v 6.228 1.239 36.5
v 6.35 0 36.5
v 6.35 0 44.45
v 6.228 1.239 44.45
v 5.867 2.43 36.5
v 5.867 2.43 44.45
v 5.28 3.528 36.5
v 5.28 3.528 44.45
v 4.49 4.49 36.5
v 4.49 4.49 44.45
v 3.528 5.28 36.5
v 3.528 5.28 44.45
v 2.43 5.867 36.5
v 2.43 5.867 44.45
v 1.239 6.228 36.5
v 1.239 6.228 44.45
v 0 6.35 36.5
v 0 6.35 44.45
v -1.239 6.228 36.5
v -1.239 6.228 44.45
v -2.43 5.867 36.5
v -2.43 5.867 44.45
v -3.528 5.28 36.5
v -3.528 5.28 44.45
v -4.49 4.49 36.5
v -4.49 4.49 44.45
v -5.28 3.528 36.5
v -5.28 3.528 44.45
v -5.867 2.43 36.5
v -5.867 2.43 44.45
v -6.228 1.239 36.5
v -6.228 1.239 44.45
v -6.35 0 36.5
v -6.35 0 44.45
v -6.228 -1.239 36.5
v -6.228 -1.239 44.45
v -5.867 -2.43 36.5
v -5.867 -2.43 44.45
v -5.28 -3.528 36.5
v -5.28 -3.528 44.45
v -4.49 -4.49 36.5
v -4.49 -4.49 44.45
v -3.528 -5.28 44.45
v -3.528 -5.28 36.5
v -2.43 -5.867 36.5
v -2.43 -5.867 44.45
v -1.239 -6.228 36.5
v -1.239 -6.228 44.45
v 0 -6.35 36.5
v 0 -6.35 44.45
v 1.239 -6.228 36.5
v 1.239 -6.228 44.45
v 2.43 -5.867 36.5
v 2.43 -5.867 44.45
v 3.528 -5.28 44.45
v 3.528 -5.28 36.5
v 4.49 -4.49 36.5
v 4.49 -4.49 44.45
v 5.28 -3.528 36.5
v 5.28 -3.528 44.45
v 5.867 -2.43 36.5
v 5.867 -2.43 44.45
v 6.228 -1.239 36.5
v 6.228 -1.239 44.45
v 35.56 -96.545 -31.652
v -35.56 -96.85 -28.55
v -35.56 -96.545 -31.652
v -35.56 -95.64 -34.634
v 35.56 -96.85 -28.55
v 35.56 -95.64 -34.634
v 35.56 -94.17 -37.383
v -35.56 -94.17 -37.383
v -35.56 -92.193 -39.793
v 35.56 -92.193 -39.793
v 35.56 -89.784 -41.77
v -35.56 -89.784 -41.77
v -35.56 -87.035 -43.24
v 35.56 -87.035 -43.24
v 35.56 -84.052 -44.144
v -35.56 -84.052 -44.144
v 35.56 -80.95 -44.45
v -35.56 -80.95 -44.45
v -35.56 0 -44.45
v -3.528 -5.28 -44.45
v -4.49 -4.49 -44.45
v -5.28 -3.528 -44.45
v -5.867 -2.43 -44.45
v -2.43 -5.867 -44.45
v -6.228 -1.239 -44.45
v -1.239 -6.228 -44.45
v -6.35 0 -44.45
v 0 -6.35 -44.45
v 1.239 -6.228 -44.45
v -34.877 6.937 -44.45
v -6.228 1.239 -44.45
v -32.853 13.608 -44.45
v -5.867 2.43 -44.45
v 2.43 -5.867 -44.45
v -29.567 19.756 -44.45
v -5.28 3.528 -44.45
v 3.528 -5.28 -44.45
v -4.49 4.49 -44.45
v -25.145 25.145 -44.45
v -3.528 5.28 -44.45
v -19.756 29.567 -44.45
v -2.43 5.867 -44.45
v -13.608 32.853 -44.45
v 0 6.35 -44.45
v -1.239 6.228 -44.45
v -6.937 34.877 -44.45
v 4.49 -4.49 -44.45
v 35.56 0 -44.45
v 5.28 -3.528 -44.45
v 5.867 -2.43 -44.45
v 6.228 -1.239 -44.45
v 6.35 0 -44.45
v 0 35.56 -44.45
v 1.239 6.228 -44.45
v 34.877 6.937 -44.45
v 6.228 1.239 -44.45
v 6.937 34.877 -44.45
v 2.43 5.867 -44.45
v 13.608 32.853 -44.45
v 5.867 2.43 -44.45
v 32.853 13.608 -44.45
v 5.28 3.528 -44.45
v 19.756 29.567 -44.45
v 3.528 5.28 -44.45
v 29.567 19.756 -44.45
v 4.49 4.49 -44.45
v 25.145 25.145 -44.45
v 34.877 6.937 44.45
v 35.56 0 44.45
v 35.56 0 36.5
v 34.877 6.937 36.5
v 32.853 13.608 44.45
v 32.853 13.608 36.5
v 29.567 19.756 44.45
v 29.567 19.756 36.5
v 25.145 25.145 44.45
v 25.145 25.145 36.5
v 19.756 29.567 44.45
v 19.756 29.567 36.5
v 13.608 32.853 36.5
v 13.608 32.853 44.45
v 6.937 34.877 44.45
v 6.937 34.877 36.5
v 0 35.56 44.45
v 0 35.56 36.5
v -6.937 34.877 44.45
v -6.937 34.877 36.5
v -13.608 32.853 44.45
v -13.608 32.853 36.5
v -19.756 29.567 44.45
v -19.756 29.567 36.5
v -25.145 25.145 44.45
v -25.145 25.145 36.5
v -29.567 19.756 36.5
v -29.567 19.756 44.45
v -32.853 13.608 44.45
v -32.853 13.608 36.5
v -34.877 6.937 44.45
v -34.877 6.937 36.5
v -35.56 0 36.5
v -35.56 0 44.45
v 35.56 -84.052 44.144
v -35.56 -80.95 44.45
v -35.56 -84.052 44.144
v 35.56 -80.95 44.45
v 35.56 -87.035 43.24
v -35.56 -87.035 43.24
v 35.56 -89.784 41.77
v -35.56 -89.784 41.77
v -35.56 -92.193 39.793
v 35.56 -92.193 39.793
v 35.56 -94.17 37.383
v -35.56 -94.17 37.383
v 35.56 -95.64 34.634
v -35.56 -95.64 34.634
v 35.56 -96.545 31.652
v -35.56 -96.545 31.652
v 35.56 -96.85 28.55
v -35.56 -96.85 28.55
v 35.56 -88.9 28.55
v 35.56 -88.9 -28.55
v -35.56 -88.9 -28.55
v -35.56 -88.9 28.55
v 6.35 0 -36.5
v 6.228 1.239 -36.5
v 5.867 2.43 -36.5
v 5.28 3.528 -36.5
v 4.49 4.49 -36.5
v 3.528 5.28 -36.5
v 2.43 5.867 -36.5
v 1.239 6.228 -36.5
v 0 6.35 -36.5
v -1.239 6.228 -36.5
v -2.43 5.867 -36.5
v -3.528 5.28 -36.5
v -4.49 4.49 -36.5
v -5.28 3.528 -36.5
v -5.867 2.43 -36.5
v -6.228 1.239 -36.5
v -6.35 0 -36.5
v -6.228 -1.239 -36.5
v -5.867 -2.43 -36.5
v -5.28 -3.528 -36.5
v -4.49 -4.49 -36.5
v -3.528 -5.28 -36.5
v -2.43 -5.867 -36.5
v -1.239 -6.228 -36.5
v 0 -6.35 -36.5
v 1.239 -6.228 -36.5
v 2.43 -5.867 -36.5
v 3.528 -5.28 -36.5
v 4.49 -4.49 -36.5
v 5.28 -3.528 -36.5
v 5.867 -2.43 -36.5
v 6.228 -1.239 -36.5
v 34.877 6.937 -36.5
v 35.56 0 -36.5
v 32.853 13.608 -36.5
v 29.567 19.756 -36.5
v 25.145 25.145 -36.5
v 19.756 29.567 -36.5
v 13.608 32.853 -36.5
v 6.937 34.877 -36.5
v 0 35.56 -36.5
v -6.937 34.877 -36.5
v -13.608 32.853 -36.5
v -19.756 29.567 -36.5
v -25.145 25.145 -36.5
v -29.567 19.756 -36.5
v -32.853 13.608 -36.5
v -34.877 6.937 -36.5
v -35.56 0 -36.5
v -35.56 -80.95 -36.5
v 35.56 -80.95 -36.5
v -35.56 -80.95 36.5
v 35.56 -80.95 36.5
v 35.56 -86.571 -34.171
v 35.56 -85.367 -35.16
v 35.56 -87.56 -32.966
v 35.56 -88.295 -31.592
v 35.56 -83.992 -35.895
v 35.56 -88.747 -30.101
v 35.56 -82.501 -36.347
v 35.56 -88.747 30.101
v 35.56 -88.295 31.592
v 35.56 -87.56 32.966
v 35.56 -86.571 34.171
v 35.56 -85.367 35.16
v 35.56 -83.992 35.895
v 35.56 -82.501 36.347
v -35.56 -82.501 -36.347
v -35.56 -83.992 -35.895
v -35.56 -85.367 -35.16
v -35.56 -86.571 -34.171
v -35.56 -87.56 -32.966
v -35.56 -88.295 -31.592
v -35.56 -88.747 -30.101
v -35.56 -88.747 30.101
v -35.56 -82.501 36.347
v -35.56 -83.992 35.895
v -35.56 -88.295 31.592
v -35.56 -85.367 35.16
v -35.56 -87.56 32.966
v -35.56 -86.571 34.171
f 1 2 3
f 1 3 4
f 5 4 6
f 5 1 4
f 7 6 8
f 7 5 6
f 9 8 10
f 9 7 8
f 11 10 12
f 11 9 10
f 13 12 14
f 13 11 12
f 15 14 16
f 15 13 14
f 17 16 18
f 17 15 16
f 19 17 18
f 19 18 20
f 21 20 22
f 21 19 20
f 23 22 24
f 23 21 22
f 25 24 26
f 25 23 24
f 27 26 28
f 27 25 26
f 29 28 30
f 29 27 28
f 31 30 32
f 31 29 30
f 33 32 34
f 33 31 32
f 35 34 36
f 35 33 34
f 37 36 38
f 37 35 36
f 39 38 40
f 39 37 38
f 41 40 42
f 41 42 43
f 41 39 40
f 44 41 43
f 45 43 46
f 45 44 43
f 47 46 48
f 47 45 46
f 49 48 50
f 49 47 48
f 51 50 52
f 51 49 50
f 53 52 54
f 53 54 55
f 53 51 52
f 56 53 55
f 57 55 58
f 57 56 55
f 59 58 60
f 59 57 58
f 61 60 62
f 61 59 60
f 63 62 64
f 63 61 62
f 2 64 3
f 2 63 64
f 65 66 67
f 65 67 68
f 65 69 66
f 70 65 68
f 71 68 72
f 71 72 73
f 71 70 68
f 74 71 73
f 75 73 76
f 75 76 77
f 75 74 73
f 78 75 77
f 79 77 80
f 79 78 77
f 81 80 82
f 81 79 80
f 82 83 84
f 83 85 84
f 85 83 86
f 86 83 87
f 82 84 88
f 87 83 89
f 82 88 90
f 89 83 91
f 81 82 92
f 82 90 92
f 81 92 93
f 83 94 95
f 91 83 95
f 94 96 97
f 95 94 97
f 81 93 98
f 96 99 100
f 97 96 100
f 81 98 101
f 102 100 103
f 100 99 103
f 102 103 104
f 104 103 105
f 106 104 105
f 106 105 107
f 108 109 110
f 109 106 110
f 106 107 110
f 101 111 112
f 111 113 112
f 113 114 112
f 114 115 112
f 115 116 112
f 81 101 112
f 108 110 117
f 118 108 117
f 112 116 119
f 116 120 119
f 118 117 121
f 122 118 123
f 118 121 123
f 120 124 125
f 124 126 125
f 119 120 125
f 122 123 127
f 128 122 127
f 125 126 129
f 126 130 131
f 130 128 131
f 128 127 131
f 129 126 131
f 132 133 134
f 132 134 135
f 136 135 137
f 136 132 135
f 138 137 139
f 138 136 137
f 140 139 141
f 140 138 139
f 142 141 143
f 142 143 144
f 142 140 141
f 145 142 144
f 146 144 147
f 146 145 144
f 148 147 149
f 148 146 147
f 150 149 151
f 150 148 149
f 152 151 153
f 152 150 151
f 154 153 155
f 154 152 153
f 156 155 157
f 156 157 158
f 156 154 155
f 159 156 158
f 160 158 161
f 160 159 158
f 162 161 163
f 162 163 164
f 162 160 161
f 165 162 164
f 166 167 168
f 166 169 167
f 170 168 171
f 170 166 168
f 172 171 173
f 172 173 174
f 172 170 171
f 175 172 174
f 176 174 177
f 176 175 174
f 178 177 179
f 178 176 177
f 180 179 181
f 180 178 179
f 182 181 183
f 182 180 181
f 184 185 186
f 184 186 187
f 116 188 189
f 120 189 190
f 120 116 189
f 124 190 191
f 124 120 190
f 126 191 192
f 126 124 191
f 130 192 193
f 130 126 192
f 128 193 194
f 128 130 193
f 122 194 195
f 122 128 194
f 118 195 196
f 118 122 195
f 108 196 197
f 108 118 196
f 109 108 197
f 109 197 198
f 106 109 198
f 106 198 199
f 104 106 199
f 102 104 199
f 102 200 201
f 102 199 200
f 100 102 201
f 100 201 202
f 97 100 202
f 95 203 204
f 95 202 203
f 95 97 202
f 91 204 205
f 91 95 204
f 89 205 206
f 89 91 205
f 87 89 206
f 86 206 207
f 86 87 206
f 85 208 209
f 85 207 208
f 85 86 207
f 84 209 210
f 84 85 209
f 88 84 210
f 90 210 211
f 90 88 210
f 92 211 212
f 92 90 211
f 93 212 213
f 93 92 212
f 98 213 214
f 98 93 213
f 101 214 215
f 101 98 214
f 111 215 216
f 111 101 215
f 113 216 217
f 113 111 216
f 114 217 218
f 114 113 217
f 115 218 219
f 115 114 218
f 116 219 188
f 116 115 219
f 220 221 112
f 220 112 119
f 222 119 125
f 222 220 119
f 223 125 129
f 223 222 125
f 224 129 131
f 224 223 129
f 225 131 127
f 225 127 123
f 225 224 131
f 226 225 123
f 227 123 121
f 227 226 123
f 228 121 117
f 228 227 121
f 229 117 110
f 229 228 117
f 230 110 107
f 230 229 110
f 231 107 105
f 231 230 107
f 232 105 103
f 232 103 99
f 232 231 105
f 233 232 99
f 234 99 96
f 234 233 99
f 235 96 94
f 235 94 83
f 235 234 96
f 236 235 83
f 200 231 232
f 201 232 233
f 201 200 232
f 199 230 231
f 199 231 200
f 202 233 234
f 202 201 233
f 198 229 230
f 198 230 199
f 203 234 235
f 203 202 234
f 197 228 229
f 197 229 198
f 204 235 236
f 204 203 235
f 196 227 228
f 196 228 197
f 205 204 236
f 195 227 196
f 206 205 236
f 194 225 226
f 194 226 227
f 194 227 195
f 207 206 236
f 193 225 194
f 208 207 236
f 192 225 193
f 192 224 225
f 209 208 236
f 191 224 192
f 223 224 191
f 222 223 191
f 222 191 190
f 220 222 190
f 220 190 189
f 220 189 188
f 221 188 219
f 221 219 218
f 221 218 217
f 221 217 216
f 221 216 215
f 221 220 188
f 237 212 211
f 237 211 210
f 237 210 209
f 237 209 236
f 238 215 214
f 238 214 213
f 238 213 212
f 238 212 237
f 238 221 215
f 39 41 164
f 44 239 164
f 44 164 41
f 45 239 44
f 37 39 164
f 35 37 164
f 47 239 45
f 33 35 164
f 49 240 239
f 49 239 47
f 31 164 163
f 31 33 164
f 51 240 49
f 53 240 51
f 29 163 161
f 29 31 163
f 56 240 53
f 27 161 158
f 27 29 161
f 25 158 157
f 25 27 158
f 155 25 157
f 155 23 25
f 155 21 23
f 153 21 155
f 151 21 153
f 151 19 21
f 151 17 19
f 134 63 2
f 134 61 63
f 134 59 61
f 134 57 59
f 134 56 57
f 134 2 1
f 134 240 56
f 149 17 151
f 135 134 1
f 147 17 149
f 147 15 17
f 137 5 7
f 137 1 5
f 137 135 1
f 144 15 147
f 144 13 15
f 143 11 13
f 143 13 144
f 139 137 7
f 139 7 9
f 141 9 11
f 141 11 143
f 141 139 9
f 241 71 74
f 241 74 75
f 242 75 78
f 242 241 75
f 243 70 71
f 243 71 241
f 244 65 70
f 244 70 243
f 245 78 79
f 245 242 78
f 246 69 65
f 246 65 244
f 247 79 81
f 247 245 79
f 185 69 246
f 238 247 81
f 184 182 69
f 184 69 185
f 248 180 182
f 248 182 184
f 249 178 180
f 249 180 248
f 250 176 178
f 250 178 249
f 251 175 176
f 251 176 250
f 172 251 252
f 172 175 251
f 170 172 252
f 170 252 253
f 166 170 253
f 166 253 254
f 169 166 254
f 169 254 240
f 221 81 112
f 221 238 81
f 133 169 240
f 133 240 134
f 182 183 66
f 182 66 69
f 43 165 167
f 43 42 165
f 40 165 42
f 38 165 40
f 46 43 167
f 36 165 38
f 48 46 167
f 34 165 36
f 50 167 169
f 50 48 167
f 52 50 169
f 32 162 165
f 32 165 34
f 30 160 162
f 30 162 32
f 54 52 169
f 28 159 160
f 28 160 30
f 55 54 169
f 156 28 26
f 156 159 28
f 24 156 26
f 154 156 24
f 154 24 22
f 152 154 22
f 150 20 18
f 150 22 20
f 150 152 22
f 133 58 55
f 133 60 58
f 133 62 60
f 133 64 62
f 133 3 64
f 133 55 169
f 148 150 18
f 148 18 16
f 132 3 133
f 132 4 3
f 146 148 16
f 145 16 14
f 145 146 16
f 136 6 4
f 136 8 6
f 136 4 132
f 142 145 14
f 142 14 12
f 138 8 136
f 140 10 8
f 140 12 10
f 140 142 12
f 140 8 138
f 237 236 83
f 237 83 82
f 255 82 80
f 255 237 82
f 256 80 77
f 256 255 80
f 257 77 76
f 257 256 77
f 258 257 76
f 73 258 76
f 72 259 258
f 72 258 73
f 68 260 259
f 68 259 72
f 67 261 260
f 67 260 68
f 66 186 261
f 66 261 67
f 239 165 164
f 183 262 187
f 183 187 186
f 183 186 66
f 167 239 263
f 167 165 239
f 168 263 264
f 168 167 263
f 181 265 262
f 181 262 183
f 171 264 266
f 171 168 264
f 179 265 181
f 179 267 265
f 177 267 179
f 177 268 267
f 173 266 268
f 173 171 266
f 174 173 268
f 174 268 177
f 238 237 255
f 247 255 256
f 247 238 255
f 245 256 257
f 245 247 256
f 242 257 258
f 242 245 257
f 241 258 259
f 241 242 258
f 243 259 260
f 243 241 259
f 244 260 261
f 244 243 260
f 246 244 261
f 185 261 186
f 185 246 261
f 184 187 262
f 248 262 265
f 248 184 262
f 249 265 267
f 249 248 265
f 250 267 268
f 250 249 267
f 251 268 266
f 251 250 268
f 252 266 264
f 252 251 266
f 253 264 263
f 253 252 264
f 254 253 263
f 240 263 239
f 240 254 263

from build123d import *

# Parameters (mm, degrees)
SKETCH1_R           = 6.35
BOSS_EXTRUDE1_DEPTH = 44.45
CUT_EXTRUDE1_DEPTH  = 129.116424162
FILLET1_R           = 15.9004


with BuildPart() as part:
    # Sketch1 → Boss-Extrude1 (new, symmetric)
    with BuildSketch(Plane.XY):
        with BuildLine():
            Line((-35.56, 0), (-35.56, -96.8502))
            Line((-35.56, -96.8502), (35.56, -96.8502))
            Line((35.56, -96.8502), (35.56, 0))
            ThreePointArc((35.56, 0), (0, 35.56), (-35.56, 0))
        make_face()
        Circle(SKETCH1_R, mode=Mode.SUBTRACT)
    extrude(amount=BOSS_EXTRUDE1_DEPTH, both=True)

    # Sketch2 → Cut-Extrude1 (cut, through all)
    with BuildSketch(Plane(origin=(35.56, 0, 0), x_dir=(0, 0, -1), z_dir=(1, 0, 0))):
        with BuildLine():
            Line((-36.4998, 50.8), (36.4998, 50.8))
            Line((36.4998, 50.8), (36.4998, -80.9498))
            ThreePointArc((36.4998, -80.9498), (34.171240332, -86.571440332), (28.5496, -88.9))
            Line((28.5496, -88.9), (-28.5496, -88.9))
            ThreePointArc((-28.5496, -88.9), (-34.171240332, -86.571440332), (-36.4998, -80.9498))
            Line((-36.4998, -80.9498), (-36.4998, 50.8))
        make_face()
    extrude(amount=-CUT_EXTRUDE1_DEPTH, mode=Mode.SUBTRACT)

    # Fillet1
    fillet1_edges = [part.edges().sort_by_distance(p)[0] for p in [
        (0, -96.8502, 44.45),
        (0, -96.8502, -44.45),
    ]]
    fillet(fillet1_edges, radius=FILLET1_R)


solid = part.part
